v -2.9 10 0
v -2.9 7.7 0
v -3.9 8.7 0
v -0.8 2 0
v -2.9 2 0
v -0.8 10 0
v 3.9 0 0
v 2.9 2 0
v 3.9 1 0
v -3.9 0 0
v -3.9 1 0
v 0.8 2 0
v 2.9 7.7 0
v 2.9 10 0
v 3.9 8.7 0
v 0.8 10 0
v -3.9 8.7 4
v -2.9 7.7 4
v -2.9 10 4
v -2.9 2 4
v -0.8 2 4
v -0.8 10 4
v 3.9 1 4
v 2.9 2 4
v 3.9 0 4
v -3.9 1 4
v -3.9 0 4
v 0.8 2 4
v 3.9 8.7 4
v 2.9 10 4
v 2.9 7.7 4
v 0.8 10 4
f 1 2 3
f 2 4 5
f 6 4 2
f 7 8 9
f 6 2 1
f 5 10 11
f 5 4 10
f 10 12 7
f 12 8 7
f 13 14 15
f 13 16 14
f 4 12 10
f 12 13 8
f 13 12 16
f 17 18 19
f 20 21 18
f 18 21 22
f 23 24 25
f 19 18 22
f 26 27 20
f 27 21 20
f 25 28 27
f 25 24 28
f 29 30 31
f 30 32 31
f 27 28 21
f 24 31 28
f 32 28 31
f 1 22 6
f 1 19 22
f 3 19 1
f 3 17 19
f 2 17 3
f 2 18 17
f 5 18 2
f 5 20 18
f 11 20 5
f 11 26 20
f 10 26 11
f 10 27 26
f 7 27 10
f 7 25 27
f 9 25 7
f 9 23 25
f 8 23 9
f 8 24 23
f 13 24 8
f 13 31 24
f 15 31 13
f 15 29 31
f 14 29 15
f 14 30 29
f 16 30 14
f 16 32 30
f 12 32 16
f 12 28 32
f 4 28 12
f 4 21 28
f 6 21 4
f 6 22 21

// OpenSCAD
linear_extrude(height = 4.0, twist = 0.0, scale = 1.0, slices = 1, center = false)
{
    union()
    {
        M238();
        mirror([1.0, 0.0])
        {
            M238();
        }
    }
}

module M238()
{
    polygon
    (
        points =
        [
            [0.0, 0.0], 
            [3.9, 0.0], 
            [3.9, 1.0], 
            [2.9, 2.0], 
            [2.9, 7.7], 
            [3.9, 8.7], 
            [2.9, 10.0], 
            [0.8, 10.0], 
            [0.8, 2.0], 
            [0.0, 2.0]
        ],
        paths =
        [
            [0, 1, 2, 3, 4, 5, 6, 7, 8, 9]
        ]
    );
}
